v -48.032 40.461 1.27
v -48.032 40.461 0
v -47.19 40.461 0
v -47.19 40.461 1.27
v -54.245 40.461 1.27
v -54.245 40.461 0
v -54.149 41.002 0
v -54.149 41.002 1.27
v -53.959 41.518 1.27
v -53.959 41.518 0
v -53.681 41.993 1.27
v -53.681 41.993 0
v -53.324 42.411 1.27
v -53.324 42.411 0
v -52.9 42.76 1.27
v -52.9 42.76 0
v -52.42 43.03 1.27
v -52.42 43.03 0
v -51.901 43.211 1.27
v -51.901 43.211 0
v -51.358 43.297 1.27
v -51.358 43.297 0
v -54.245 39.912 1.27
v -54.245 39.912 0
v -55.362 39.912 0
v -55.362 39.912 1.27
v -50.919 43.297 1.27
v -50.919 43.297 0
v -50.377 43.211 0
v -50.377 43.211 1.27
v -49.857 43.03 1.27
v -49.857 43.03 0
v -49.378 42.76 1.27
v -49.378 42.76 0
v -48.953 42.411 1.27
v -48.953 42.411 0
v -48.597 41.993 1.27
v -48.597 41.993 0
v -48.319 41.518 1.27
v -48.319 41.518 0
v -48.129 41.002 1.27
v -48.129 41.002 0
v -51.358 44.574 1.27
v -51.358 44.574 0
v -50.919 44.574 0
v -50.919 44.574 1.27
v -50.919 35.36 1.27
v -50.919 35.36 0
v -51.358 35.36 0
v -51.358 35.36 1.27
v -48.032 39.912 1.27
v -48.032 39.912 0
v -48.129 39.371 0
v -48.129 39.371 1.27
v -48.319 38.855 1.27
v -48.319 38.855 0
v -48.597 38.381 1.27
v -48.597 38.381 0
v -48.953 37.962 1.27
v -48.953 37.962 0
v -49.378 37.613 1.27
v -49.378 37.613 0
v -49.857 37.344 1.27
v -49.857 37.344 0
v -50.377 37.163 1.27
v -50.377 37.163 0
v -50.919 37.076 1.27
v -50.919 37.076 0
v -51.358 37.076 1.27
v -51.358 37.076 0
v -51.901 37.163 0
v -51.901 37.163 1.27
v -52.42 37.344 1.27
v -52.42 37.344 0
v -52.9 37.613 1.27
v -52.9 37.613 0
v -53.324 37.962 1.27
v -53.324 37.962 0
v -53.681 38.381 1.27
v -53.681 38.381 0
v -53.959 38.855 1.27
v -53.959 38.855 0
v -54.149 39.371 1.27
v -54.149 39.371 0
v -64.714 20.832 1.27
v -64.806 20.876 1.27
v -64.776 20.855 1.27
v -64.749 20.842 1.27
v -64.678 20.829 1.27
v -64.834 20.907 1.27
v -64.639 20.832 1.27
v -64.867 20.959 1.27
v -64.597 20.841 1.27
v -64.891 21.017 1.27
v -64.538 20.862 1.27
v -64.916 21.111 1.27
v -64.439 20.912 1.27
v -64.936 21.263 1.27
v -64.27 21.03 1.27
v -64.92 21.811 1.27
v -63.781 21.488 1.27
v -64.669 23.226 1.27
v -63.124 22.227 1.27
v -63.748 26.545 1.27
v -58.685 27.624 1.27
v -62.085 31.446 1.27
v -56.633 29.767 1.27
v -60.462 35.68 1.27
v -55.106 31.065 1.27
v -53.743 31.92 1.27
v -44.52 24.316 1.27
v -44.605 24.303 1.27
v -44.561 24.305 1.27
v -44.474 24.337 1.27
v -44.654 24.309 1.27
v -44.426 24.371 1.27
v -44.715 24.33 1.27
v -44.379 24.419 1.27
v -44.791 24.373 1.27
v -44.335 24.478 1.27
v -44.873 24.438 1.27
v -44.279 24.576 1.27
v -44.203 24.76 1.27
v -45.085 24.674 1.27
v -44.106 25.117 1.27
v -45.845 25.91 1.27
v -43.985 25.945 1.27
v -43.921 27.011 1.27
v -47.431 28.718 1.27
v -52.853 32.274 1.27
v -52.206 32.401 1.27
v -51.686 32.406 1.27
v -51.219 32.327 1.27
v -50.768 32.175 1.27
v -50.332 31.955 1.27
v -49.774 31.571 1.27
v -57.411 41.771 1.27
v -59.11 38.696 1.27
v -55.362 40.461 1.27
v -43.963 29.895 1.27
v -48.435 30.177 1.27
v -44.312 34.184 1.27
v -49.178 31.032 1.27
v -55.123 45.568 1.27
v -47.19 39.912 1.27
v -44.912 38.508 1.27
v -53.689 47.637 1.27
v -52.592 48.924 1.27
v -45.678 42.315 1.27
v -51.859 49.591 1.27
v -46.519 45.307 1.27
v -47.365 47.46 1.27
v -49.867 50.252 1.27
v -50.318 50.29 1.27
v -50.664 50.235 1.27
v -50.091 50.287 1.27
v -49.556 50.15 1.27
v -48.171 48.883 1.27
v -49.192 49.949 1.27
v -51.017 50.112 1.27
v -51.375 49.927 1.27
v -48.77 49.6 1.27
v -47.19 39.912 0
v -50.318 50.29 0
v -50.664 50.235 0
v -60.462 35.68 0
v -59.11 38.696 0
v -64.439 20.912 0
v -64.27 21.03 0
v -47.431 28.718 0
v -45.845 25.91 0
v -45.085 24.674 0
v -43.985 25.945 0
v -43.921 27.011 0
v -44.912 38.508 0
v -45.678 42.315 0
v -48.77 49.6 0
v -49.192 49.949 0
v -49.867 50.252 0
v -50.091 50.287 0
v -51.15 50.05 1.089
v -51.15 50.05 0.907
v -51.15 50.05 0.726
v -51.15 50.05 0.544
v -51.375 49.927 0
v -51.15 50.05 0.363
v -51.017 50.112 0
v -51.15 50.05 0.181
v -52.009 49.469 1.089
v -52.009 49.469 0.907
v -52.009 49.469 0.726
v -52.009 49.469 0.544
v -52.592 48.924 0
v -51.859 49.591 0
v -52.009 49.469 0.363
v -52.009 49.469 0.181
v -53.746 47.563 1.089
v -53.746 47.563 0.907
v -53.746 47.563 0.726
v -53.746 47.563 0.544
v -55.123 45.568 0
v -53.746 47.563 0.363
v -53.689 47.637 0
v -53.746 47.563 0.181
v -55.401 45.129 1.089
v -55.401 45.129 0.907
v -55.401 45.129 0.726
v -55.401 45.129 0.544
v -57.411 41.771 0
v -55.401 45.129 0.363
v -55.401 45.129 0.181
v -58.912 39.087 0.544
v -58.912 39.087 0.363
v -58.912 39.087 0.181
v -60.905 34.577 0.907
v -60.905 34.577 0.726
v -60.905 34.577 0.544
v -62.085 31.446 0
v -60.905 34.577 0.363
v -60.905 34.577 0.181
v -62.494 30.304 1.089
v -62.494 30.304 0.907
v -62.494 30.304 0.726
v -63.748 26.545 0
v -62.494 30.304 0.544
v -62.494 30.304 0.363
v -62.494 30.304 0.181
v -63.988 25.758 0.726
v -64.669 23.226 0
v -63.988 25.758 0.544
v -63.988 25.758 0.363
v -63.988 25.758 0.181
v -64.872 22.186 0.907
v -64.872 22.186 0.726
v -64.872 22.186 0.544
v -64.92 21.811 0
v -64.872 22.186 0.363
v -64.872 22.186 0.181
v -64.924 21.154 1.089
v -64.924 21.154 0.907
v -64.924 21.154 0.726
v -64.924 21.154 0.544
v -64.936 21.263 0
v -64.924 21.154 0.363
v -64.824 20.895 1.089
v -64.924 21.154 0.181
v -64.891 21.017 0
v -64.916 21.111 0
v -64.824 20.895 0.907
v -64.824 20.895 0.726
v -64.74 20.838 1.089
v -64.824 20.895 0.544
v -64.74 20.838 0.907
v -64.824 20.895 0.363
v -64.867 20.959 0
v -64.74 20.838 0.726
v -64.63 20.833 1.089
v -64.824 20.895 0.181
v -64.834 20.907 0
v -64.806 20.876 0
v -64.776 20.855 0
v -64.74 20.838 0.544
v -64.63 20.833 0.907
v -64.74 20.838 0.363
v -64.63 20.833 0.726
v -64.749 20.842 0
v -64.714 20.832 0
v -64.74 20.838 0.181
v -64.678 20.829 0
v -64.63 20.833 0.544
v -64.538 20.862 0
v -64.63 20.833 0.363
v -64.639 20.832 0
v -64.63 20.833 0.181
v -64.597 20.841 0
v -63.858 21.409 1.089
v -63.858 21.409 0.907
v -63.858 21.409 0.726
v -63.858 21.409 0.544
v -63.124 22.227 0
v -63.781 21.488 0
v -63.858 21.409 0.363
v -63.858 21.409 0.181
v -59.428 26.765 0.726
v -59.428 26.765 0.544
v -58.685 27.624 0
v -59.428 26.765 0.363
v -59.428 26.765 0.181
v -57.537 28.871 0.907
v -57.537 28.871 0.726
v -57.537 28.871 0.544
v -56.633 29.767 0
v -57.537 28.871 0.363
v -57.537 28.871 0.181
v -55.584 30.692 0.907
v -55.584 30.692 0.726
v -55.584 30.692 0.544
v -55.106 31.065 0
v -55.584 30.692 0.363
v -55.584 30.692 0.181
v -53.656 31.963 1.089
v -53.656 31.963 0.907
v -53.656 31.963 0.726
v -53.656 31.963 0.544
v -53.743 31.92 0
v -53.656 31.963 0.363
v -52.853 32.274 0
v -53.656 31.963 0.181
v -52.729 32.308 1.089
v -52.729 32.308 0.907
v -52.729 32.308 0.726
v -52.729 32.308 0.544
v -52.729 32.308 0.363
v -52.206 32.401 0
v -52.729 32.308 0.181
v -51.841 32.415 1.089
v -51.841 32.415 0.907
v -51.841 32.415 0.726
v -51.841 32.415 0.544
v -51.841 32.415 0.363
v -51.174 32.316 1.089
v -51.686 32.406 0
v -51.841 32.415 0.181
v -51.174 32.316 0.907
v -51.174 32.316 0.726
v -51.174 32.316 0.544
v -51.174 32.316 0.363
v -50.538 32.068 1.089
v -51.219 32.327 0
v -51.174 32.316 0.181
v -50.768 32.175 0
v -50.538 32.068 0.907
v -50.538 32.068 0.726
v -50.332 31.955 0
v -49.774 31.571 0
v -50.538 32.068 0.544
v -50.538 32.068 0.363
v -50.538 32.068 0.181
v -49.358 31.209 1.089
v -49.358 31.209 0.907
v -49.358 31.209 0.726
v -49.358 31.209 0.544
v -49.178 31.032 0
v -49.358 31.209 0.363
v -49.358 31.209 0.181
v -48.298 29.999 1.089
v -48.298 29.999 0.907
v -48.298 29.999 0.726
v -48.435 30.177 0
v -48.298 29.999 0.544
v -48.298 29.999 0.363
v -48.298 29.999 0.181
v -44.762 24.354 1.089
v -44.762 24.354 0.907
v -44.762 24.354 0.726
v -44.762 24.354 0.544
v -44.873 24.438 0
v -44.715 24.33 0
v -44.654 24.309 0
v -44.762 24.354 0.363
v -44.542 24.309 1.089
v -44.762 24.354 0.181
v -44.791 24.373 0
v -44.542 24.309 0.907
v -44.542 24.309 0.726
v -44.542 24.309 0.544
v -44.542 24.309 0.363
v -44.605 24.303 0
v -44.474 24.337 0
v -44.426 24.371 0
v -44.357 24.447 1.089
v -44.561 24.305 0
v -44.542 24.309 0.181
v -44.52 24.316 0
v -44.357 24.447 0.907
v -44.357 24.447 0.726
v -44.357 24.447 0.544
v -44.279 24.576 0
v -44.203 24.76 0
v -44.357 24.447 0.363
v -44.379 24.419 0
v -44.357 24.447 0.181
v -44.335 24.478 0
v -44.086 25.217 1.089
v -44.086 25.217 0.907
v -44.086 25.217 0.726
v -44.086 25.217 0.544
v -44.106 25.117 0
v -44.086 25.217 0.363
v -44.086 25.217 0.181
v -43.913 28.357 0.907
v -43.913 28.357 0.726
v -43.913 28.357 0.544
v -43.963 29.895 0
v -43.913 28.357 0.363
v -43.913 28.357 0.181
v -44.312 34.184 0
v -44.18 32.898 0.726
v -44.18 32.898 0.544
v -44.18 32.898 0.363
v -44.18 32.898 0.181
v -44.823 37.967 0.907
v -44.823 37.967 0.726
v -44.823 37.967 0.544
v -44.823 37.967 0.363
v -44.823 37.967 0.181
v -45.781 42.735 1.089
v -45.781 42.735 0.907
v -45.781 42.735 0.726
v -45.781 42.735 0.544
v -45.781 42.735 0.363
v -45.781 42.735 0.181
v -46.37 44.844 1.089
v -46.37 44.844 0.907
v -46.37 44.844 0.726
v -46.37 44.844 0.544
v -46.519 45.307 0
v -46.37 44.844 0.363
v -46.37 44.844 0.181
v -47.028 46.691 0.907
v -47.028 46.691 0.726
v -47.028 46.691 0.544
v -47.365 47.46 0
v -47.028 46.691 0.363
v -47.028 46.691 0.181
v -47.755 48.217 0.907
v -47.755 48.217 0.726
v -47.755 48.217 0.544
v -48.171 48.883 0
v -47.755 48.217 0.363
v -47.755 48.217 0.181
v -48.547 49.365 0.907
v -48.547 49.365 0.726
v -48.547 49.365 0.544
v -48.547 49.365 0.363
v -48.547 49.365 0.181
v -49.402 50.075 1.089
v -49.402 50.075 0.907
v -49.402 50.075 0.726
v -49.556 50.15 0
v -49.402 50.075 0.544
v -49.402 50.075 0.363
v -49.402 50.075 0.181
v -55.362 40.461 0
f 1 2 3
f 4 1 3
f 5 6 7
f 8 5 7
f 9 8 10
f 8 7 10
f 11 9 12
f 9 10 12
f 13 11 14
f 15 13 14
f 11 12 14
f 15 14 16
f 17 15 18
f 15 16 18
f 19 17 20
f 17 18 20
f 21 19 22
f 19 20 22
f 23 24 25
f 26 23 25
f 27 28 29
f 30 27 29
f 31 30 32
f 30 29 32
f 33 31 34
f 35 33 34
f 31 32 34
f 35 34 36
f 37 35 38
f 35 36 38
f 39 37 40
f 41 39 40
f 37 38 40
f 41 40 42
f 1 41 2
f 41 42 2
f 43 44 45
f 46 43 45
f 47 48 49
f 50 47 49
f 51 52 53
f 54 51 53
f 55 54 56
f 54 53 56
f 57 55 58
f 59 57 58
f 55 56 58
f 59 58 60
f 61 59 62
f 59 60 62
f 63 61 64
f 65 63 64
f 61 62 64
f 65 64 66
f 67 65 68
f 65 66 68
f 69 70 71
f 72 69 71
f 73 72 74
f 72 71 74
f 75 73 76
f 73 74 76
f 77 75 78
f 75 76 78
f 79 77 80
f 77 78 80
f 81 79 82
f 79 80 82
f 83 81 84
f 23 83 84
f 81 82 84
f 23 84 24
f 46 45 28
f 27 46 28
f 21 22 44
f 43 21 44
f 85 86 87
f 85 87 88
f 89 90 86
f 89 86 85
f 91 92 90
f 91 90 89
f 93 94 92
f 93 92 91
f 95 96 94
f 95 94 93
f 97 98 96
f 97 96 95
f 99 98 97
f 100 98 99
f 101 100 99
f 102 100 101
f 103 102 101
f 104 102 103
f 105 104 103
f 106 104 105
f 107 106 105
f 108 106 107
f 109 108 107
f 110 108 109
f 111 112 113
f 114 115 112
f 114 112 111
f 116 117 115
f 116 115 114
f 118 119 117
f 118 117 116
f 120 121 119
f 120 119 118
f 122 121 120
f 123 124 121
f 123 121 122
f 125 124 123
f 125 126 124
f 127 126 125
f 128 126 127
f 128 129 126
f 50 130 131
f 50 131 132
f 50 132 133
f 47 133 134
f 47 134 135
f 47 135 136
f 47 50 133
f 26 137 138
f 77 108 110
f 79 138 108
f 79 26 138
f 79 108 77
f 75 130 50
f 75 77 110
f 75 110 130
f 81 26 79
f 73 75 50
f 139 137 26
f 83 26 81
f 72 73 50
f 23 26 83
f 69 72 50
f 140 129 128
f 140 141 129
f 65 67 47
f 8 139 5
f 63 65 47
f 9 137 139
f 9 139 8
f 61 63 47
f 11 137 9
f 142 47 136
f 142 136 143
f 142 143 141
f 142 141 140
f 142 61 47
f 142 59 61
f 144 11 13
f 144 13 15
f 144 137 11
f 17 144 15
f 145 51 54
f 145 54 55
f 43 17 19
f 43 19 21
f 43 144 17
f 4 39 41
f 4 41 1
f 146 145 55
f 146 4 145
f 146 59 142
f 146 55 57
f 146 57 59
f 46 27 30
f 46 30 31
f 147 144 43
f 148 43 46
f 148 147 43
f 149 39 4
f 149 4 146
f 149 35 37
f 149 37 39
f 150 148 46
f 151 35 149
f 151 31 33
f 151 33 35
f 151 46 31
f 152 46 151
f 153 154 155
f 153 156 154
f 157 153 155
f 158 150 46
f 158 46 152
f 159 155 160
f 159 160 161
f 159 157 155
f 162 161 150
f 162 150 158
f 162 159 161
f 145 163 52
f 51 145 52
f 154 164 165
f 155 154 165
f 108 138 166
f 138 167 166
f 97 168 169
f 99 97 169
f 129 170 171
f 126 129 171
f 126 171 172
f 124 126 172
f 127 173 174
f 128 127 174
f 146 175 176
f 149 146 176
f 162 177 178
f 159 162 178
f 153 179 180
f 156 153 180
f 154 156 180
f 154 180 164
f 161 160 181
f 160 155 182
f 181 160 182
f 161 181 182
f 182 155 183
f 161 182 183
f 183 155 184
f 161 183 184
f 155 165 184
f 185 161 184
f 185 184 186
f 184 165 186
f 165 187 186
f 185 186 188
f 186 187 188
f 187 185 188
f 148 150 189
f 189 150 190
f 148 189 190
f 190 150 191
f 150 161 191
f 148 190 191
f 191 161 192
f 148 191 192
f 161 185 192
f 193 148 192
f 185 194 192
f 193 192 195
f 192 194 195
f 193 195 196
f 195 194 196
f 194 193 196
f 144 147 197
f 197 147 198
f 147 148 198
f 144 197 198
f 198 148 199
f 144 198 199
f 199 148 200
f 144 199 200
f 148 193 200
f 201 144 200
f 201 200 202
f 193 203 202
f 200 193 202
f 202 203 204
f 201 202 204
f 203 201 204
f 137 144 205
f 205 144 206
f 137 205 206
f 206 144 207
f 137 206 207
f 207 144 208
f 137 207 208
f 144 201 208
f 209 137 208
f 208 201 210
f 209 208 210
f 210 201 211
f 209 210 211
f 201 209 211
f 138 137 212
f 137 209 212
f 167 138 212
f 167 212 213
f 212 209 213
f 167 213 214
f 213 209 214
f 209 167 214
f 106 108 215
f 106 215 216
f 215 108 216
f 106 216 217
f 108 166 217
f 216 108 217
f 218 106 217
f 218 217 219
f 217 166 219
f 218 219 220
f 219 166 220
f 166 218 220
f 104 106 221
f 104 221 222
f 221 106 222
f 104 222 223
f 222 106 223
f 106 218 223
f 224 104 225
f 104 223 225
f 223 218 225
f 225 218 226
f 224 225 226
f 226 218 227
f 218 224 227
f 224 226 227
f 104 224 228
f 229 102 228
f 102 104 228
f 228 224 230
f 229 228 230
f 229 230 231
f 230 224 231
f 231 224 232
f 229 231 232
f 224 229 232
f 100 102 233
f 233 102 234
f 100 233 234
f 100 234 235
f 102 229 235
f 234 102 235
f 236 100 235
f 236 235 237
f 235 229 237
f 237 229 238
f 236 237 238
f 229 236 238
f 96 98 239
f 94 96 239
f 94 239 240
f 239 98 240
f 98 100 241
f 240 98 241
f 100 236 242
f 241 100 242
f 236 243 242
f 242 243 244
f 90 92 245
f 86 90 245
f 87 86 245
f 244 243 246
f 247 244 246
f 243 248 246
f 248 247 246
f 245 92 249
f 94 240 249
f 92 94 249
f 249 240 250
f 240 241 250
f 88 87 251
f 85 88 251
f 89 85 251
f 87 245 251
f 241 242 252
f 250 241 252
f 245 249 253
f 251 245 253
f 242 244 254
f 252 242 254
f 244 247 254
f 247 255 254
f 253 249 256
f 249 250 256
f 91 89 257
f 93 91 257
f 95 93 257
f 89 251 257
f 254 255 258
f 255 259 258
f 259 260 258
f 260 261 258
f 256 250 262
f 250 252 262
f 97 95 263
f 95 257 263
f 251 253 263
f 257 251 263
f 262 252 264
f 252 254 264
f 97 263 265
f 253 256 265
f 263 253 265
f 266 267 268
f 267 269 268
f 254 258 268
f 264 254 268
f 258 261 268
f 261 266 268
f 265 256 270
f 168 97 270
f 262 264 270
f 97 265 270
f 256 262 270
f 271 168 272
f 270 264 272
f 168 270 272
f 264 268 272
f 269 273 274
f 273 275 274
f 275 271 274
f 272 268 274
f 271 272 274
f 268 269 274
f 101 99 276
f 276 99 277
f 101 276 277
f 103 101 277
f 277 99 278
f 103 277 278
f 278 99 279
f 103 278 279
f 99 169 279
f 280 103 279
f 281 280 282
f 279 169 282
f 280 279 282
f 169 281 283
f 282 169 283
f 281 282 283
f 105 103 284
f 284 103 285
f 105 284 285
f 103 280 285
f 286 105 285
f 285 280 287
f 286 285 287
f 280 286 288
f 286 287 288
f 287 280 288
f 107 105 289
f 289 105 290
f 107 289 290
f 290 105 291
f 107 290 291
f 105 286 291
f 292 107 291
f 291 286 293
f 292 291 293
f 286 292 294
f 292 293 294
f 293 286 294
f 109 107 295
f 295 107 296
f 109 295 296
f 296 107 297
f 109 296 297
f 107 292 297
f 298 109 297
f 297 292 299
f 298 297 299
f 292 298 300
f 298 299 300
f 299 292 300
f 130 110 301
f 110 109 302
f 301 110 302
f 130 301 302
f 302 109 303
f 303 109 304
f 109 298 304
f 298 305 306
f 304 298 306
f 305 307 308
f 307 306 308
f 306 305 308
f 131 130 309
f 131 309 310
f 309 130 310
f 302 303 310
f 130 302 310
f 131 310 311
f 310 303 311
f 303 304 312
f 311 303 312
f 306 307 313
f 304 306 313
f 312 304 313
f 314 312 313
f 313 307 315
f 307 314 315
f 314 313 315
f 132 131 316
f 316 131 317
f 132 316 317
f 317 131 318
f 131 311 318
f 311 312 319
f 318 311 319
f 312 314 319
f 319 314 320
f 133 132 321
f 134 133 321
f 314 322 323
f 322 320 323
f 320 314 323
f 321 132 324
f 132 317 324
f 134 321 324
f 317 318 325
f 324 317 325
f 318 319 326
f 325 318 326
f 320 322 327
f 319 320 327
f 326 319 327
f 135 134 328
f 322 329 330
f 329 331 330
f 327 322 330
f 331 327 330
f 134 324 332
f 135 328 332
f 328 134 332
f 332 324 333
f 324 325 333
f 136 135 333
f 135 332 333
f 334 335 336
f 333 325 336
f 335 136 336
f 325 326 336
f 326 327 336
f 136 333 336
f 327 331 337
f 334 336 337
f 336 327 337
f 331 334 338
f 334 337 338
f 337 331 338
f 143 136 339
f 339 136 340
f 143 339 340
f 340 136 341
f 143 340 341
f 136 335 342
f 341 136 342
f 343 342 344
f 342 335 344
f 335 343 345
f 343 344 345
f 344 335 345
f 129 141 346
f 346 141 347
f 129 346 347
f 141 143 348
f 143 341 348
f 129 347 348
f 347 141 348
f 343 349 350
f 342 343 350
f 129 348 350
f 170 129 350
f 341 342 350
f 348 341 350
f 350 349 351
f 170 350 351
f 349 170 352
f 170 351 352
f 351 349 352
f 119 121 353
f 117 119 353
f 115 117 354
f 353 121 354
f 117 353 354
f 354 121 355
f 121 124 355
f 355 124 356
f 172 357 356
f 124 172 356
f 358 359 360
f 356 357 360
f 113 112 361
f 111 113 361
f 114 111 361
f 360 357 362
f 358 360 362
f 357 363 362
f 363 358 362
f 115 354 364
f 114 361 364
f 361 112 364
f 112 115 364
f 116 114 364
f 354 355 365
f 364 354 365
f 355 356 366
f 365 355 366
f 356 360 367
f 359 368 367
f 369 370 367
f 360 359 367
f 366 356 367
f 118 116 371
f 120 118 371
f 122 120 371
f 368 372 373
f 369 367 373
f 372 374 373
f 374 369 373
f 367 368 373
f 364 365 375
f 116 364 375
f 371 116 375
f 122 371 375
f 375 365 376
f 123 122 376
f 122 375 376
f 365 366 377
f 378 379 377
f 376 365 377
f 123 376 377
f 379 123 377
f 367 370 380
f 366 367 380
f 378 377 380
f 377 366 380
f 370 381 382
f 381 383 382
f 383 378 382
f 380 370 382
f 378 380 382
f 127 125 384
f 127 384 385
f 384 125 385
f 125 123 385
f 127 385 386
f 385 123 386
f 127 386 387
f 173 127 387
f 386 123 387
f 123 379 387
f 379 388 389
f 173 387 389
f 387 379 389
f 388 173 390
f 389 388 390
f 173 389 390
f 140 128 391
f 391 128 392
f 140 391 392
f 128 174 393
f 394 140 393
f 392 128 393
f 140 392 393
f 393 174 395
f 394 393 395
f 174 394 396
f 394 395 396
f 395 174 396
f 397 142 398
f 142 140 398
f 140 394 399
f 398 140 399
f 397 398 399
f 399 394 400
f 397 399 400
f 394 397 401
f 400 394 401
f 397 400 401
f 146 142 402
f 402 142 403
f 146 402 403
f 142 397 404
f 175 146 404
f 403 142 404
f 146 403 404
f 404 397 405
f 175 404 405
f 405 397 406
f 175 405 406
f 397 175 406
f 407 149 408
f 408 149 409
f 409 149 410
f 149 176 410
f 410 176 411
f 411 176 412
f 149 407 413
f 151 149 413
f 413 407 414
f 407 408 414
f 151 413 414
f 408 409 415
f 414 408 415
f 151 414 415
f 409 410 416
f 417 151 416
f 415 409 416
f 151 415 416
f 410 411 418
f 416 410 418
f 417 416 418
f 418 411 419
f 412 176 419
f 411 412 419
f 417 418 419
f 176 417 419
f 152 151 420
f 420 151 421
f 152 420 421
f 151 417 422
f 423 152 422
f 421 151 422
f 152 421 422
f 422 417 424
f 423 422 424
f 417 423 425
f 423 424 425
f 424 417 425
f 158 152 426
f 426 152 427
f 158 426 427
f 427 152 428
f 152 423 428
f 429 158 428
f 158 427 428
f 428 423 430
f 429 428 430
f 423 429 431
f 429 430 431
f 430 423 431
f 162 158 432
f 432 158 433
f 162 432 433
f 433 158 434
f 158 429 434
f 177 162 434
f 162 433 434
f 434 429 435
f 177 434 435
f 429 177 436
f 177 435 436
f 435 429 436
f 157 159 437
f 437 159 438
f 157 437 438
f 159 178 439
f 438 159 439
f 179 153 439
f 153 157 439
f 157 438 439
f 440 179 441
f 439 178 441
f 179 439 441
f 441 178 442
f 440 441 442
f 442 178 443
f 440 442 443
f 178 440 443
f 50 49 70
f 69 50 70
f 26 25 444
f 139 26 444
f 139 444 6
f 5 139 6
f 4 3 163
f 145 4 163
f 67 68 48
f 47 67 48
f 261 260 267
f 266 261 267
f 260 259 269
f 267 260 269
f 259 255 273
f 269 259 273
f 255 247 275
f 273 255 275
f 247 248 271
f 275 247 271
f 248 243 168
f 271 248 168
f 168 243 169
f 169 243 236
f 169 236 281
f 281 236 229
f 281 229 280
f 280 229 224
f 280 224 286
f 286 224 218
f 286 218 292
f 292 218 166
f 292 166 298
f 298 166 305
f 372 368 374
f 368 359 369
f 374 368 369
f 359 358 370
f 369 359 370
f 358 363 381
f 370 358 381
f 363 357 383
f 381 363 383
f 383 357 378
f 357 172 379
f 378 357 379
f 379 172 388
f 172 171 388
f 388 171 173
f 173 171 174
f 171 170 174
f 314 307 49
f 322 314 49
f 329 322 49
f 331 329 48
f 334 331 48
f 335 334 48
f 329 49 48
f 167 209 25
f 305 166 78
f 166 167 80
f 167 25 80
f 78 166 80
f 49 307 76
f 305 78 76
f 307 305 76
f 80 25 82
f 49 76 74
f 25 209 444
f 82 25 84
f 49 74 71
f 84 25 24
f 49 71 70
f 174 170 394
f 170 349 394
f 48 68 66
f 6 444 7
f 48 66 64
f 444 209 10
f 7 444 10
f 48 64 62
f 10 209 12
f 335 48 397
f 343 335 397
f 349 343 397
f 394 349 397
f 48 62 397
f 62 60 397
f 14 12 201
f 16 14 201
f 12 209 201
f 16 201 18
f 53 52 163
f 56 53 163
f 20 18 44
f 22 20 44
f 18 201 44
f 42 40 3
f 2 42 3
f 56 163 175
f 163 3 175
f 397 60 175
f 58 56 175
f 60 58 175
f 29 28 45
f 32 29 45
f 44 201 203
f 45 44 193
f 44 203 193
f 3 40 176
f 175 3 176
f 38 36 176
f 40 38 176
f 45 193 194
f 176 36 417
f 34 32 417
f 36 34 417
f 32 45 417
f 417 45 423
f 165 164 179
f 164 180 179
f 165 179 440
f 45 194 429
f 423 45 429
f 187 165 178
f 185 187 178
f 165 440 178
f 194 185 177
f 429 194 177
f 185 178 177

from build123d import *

# Parameters (mm, degrees)
F1_DEPTH = 1.27


with BuildPart() as f1:
    # F0 (on Top) → F1 (new body)
    with BuildSketch(Plane.XY):
        with BuildLine():
            add(Edge.make_bspline(
                [(-50.3175632004, 50.2897321245), (-52.4862384246, 50.1674002007), (-57.6221835874, 41.3645502611), (-60.3968377144, 36.8205547074), (-69.3195453246, 10.6832618923), (-51.1400444544, 41.5666437214), (-43.2766006041, 16.8103664528), (-43.989749351, 38.8587220751), (-47.7977187986, 50.4318730084), (-50.3175632004, 50.2897321245)],
                knots=[0, 0, 0, 0, 0.1277628132, 0.2496927266, 0.4021981193, 0.5700715307, 0.7024394258, 0.8515488138, 1, 1, 1, 1], degree=3))
        make_face()
        with BuildLine():
            ThreePointArc((-50.9194433689, 43.2974091239), (-48.9532547535, 42.4111158824), (-48.0324110687, 40.4608696699))
            Line((-48.0324110687, 40.4608696699), (-47.1899397671, 40.4608696699))
            Line((-47.1899397671, 40.4608696699), (-47.1899397671, 39.9124100804))
            Line((-47.1899397671, 39.9124100804), (-48.0324110687, 39.9124100804))
            ThreePointArc((-48.0324110687, 39.9124100804), (-48.9532547535, 37.9621638679), (-50.9194433689, 37.0758706264))
            Line((-50.9194433689, 37.0758706264), (-50.9194433689, 35.3602208197))
            Line((-50.9194433689, 35.3602208197), (-51.3582080603, 35.3602208197))
            Line((-51.3582080603, 35.3602208197), (-51.3582080603, 37.0758706264))
            ThreePointArc((-51.3582080603, 37.0758706264), (-53.3243966756, 37.9621638679), (-54.2452403605, 39.9124100804))
            Line((-54.2452403605, 39.9124100804), (-55.3619414568, 39.9124100804))
            Line((-55.3619414568, 39.9124100804), (-55.3619414568, 40.4608696699))
            Line((-55.3619414568, 40.4608696699), (-54.2452403605, 40.4608696699))
            ThreePointArc((-54.2452403605, 40.4608696699), (-53.3243966756, 42.4111158824), (-51.3582080603, 43.2974091239))
            Line((-51.3582080603, 43.2974091239), (-51.3582080603, 44.574290514))
            Line((-51.3582080603, 44.574290514), (-50.9194433689, 44.574290514))
            Line((-50.9194433689, 44.574290514), (-50.9194433689, 43.2974091239))
        make_face(mode=Mode.SUBTRACT)
    extrude(amount=F1_DEPTH)


solid = f1.part
